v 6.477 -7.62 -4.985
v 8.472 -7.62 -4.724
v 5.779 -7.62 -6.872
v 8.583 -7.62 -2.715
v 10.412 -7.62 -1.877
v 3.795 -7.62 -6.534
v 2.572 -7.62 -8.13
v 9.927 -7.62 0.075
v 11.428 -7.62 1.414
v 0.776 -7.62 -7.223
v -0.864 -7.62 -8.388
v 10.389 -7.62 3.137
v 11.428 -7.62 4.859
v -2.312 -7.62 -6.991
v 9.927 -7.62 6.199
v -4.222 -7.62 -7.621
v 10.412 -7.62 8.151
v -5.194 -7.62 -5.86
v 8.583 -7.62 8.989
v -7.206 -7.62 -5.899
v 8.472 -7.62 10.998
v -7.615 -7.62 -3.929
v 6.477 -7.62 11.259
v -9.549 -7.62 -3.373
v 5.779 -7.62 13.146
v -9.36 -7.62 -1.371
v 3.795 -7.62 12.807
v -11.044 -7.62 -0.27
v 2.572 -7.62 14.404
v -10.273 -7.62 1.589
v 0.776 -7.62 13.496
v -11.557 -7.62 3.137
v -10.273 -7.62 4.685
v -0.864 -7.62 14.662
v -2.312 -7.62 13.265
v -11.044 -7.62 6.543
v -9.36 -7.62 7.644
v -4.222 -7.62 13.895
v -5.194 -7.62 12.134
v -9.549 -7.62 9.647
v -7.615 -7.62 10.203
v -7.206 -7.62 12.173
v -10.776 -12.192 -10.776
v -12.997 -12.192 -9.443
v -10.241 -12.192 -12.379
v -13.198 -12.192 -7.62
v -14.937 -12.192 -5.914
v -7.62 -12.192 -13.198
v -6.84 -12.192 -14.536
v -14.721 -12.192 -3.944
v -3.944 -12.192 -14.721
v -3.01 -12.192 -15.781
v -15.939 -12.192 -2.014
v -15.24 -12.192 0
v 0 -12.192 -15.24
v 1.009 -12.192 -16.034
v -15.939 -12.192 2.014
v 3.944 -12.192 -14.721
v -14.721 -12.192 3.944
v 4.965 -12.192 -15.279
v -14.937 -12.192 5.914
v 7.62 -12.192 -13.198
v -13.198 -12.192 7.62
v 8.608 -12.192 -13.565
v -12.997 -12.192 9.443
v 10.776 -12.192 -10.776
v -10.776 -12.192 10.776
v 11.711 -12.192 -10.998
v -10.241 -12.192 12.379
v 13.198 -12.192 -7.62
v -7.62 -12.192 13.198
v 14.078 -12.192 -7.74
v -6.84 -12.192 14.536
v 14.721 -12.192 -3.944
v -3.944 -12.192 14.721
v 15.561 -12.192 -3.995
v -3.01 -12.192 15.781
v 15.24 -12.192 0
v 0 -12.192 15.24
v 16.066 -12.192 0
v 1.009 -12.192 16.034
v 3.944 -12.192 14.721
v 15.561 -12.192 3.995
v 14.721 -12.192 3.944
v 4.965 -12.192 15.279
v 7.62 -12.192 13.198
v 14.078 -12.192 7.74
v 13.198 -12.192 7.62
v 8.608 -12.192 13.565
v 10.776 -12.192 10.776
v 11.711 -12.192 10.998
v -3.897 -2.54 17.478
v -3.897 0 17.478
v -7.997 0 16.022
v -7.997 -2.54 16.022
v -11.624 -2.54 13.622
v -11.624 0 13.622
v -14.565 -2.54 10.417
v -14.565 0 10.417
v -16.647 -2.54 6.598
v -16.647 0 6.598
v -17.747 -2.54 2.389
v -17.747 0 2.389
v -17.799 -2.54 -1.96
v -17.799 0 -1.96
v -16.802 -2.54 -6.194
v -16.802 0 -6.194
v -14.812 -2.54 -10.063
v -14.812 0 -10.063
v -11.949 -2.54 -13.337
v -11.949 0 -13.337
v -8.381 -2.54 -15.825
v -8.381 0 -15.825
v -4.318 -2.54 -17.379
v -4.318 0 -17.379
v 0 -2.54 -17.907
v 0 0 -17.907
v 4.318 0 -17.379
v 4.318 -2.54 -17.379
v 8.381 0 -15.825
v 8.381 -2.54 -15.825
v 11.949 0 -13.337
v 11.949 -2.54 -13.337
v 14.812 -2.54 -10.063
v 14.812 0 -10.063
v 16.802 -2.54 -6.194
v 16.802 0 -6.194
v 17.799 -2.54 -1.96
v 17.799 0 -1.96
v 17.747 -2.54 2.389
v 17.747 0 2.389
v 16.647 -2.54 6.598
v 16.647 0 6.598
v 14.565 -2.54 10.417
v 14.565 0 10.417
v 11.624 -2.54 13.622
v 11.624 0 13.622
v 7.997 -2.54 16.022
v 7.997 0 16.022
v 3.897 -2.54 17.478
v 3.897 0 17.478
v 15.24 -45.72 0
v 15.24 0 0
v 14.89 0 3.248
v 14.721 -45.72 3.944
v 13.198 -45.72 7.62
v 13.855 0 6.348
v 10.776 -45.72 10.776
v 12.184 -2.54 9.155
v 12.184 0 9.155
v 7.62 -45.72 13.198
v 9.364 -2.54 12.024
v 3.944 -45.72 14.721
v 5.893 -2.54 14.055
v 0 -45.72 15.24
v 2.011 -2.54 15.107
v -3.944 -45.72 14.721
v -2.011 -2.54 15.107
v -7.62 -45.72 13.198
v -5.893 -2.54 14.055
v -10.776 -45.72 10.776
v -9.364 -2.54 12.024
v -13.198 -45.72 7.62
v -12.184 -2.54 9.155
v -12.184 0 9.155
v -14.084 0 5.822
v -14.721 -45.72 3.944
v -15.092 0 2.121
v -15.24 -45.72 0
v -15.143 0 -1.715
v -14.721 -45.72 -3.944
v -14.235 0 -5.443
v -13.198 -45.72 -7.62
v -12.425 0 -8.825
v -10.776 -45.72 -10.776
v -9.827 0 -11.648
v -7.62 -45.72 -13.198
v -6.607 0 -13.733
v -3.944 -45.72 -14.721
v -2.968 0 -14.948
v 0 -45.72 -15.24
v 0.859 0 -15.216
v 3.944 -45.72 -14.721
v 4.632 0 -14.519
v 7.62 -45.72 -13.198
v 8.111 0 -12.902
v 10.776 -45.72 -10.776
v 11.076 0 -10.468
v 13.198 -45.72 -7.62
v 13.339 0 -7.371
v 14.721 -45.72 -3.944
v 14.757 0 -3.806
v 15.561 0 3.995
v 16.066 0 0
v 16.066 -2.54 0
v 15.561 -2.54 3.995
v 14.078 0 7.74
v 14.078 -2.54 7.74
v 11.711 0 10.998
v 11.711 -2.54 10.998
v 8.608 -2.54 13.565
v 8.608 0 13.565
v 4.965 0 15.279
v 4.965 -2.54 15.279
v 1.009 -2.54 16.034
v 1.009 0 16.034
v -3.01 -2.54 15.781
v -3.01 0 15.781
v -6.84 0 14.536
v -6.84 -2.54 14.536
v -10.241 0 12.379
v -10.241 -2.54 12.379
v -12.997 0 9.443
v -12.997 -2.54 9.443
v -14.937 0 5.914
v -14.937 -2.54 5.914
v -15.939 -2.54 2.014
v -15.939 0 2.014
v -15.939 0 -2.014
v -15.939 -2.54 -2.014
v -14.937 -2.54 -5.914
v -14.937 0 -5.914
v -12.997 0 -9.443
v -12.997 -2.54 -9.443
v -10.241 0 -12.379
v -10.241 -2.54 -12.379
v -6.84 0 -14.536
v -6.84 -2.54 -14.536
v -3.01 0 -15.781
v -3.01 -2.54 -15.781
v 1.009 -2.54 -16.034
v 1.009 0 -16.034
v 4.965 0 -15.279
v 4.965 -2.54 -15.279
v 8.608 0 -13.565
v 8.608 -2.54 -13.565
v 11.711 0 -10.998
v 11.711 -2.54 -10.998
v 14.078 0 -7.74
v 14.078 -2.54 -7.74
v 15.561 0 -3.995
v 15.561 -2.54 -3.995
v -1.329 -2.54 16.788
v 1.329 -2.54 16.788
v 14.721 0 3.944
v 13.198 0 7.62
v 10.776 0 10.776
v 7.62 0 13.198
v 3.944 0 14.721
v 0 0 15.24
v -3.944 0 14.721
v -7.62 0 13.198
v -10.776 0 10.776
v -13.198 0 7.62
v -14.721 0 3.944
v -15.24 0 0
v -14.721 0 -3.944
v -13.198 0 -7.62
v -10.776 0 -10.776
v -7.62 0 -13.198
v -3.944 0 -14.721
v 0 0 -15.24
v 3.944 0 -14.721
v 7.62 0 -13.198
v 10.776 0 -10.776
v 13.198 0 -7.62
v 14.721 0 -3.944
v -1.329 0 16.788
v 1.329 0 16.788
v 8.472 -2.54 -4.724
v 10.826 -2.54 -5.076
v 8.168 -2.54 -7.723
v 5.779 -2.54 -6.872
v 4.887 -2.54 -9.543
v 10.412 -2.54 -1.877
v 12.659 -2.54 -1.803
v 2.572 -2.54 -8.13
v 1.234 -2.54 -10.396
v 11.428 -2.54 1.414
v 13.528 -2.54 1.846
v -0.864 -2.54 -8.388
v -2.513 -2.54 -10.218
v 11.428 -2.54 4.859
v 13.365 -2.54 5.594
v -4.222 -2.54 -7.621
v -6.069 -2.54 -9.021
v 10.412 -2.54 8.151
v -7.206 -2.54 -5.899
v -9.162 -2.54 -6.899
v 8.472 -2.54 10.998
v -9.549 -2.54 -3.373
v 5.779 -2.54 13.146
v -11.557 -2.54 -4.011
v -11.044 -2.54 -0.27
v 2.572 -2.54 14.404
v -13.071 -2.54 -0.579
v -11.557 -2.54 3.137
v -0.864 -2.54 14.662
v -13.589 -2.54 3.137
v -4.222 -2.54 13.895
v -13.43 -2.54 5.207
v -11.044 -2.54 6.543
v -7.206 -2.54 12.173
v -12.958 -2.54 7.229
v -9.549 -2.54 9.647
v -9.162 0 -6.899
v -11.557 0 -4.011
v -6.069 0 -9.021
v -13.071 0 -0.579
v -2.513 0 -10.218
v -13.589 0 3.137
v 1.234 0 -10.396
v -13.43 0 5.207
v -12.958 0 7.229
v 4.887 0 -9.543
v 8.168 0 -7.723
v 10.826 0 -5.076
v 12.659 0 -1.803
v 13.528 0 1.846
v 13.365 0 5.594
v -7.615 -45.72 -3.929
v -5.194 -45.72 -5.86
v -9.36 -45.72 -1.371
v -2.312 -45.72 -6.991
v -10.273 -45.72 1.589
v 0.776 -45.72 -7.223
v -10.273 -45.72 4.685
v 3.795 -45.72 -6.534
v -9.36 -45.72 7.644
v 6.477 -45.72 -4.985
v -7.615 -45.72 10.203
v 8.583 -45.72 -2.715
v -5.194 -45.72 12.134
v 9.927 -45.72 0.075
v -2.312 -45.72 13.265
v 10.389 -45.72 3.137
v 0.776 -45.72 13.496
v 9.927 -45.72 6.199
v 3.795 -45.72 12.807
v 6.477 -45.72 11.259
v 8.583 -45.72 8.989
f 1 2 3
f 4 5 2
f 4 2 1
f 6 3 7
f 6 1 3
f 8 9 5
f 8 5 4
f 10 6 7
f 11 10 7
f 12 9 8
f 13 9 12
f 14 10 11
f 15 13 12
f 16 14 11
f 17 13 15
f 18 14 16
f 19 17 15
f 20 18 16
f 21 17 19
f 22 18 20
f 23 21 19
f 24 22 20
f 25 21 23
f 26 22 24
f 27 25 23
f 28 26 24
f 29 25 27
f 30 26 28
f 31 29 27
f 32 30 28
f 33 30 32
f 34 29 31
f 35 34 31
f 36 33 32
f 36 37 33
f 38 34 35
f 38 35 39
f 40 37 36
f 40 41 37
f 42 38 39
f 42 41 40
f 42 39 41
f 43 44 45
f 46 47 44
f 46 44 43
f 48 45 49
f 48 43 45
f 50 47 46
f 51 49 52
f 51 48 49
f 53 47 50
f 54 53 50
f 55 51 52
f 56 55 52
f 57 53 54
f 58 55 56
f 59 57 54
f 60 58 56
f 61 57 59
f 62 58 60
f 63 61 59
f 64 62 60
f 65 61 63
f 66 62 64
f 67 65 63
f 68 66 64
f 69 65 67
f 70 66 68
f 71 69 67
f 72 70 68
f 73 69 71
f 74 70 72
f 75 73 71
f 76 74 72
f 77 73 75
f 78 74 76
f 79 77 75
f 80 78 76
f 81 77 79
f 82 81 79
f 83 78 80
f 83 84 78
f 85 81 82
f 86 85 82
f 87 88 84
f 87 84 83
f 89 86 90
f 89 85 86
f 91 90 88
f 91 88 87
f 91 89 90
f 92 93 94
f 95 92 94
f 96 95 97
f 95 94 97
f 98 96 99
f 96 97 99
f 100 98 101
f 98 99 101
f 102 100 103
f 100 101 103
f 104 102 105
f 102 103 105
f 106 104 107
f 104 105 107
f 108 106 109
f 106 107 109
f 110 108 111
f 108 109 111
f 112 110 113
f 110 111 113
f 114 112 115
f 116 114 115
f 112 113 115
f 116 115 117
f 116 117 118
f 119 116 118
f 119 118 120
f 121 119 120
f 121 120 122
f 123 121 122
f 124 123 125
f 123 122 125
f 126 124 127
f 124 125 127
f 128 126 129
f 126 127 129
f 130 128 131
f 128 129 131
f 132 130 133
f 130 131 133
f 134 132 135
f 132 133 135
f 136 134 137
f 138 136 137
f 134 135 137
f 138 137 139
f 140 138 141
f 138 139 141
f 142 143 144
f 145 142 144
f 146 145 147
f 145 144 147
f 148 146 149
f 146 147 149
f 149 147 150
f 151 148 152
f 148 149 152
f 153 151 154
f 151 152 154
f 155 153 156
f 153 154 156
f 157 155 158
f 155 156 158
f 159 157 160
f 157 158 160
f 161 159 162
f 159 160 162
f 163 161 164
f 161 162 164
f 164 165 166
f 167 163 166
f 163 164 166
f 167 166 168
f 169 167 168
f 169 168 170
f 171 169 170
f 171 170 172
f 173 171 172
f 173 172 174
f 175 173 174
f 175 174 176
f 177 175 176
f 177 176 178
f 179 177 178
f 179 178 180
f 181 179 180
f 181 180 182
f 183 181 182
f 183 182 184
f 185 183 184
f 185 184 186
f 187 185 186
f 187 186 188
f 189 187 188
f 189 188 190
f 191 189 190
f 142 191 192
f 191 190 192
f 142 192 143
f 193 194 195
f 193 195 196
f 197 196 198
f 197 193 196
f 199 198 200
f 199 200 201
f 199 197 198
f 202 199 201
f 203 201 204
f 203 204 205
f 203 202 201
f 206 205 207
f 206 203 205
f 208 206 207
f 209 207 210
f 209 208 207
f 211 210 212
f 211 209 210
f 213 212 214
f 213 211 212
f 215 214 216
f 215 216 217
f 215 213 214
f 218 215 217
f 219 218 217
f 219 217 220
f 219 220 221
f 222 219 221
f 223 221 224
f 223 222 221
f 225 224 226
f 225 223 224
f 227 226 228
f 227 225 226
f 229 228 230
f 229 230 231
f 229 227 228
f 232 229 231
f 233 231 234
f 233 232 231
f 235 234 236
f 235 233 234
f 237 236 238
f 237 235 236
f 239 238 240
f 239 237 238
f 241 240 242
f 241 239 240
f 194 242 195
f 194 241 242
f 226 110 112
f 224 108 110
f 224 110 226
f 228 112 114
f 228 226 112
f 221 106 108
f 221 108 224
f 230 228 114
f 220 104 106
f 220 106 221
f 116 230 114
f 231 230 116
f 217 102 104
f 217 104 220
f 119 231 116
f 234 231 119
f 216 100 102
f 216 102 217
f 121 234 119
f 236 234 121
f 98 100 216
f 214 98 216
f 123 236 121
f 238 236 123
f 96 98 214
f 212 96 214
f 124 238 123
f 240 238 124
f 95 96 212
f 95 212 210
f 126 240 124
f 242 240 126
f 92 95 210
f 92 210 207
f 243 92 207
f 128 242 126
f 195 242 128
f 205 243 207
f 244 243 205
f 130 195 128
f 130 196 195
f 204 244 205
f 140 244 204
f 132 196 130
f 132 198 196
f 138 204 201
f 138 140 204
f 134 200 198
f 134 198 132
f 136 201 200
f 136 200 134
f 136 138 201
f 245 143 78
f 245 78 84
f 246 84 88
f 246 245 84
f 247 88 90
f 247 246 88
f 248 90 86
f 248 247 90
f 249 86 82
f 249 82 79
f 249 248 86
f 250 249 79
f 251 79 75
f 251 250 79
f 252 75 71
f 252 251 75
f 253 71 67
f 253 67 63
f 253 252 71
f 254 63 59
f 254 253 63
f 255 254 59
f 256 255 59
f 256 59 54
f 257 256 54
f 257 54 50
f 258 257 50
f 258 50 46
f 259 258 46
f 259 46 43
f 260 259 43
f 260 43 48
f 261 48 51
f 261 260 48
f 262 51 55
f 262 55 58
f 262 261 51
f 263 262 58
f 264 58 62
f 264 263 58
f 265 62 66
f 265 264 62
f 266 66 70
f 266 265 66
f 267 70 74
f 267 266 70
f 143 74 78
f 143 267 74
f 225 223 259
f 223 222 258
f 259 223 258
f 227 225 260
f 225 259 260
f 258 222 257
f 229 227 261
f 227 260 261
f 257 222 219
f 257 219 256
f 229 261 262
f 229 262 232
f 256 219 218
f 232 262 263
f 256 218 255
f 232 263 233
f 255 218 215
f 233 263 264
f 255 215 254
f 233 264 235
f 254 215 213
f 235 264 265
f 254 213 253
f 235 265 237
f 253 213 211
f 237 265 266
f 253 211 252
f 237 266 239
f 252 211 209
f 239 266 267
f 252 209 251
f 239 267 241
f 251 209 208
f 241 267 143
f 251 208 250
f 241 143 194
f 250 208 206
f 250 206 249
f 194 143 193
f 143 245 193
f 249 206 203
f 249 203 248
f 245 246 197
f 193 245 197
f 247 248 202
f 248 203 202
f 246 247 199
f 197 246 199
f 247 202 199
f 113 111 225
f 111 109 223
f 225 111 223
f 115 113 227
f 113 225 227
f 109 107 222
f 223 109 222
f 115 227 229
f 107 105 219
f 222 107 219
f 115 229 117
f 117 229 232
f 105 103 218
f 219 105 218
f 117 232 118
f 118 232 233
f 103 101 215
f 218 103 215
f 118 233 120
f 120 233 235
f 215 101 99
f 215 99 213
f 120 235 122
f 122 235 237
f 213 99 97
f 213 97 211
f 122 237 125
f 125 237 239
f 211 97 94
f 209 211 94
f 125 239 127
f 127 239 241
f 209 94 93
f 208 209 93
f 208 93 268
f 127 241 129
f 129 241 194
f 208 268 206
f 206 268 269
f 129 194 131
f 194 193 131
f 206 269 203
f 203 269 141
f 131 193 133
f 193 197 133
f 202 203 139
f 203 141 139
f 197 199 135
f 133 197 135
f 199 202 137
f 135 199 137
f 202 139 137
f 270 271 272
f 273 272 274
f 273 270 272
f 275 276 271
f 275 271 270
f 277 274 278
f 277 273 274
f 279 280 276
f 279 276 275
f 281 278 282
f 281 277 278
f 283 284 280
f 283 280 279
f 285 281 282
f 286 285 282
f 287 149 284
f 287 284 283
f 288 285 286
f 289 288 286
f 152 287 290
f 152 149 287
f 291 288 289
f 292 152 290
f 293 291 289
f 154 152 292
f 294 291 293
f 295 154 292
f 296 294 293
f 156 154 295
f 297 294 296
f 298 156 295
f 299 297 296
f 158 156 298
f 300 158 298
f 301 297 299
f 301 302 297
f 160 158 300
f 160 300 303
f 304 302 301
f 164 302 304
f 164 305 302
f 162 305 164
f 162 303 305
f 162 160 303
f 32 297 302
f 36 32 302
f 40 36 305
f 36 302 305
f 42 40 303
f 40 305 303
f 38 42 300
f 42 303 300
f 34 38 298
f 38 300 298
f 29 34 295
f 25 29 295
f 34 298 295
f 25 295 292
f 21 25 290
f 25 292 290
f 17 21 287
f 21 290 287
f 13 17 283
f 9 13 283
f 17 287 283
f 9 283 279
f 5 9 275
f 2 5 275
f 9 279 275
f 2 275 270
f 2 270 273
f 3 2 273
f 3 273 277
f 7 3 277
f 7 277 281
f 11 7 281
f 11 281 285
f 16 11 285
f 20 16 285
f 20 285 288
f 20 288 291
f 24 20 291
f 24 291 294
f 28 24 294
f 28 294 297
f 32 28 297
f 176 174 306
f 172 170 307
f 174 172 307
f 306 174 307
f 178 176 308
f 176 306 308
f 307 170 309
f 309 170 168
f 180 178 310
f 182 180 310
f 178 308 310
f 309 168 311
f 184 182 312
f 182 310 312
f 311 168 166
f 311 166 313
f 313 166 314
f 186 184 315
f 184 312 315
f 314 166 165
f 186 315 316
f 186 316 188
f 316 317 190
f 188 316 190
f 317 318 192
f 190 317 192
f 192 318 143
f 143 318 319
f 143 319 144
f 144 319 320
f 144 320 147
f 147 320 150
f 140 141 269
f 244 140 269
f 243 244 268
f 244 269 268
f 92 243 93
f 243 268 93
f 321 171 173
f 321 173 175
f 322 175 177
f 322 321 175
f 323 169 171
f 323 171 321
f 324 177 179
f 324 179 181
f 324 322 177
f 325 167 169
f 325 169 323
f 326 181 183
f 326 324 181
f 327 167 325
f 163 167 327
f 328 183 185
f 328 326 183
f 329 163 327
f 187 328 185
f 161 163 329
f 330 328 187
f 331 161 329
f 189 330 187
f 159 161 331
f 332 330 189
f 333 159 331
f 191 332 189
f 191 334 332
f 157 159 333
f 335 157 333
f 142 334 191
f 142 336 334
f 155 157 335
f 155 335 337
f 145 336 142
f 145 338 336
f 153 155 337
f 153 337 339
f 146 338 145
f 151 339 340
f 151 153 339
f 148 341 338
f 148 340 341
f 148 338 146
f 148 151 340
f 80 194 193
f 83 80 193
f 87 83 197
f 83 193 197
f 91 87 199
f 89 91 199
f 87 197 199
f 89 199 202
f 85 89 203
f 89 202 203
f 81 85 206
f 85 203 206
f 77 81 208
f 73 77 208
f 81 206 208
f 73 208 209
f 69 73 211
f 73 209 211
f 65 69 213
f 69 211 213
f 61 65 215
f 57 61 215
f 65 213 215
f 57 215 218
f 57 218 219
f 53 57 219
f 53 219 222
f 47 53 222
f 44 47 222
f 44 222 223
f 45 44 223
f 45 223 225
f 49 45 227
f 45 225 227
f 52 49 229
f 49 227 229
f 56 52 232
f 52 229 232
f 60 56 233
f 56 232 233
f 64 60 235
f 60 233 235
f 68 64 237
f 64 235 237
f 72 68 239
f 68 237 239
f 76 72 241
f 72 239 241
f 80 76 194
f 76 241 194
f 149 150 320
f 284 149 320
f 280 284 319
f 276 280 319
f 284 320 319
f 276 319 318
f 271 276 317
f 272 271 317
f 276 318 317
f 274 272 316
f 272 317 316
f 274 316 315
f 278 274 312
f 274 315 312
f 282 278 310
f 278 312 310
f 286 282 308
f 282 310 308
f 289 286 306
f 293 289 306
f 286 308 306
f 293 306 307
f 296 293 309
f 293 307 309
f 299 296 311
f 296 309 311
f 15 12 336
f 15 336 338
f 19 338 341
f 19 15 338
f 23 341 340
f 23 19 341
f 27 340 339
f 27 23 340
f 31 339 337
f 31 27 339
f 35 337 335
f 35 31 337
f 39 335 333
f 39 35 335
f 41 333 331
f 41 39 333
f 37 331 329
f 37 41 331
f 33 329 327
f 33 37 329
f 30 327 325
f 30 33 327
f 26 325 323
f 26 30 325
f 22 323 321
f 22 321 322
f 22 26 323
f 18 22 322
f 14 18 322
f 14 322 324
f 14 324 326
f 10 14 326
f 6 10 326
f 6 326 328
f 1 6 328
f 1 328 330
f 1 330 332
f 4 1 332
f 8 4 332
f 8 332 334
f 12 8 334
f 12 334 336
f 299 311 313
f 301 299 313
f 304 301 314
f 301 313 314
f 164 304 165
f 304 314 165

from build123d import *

# Parameters (mm, degrees)
F0_R     = 15.24
F0_R_2   = 10.3886
F1_DEPTH = 45.72
F0_R_3   = 16.0655
F2_DEPTH = 2.54
F3_DEPTH = 12.192
F4_R     = 11.557
F4_R_2   = 10.3886
F5_DEPTH = 7.62
F6_DEPTH = 5.08
F7_DEPTH = 2.54


with BuildPart() as f1:
    # F0 (on Front) → F1 (new body)
    with BuildSketch(Plane.XZ):
        Circle(F0_R)
        with Locations((0, 3.1369)):
            Circle(F0_R_2, mode=Mode.SUBTRACT)
    extrude(amount=F1_DEPTH)

    # F4 (on face) → F5 (cut)
    with BuildSketch(Plane(origin=(0, 0, 0), x_dir=(-1, 0, 0), z_dir=(0, 1, 0))):
        with Locations((0, 3.1369)):
            Circle(F4_R)
        with Locations((0, 3.1369)):
            Circle(F4_R_2, mode=Mode.SUBTRACT)
    extrude(amount=-F5_DEPTH, mode=Mode.SUBTRACT)

    # F4 (on face) → F6 (cut)
    with BuildSketch(Plane(origin=(0, 0, 0), x_dir=(-1, 0, 0), z_dir=(0, 1, 0))):
        with BuildLine():
            ThreePointArc((-12.1837204898, 9.1550289474), (0, 15.24), (12.1837204898, 9.1550289474))
            ThreePointArc((12.1837204898, 9.1550289474), (0, 16.7259), (-12.1837204898, 9.1550289474))
        make_face()
        with BuildLine():
            ThreePointArc((-12.1837204898, 9.1550289474), (-3.090011591, -10.0961173947), (13.589, 3.1369))
            ThreePointArc((13.589, 3.1369), (13.2330173947, 6.226911591), (12.1837204898, 9.1550289474))
            ThreePointArc((12.1837204898, 9.1550289474), (0, 15.24), (-12.1837204898, 9.1550289474))
        make_face()
        with Locations((0, 3.1369)):
            Circle(F4_R, mode=Mode.SUBTRACT)
    extrude(amount=F6_DEPTH, mode=Mode.SUBTRACT)

    # F4 (on face) → F7 (cut)
    with BuildSketch(Plane(origin=(0, 0, 0), x_dir=(-1, 0, 0), z_dir=(0, 1, 0))):
        with BuildLine():
            ThreePointArc((-12.1837204898, 9.1550289474), (-3.090011591, -10.0961173947), (13.589, 3.1369))
            ThreePointArc((13.589, 3.1369), (13.2330173947, 6.226911591), (12.1837204898, 9.1550289474))
            ThreePointArc((12.1837204898, 9.1550289474), (0, 15.24), (-12.1837204898, 9.1550289474))
        make_face()
        with Locations((0, 3.1369)):
            Circle(F4_R, mode=Mode.SUBTRACT)
    extrude(amount=-F7_DEPTH, mode=Mode.SUBTRACT)


with BuildPart() as f2:
    # F0 (on Front) → F2 (new body)
    with BuildSketch(Plane.XZ):
        with BuildLine():
            ThreePointArc((3.8973527479, 17.4777369976), (0, 16.7005), (-3.8973527479, 17.4777369976))
            ThreePointArc((-3.8973527479, 17.4777369976), (0, -17.907), (3.8973527479, 17.4777369976))
        make_face()
        Circle(F0_R_3, mode=Mode.SUBTRACT)
    extrude(amount=F2_DEPTH)


with BuildPart() as f3:
    # F0 (on Front) → F3 (new body)
    with BuildSketch(Plane.XZ):
        Circle(F0_R_3)
        Circle(F0_R, mode=Mode.SUBTRACT)
    extrude(amount=F3_DEPTH)


solid = Compound([f1.part, f2.part, f3.part])
